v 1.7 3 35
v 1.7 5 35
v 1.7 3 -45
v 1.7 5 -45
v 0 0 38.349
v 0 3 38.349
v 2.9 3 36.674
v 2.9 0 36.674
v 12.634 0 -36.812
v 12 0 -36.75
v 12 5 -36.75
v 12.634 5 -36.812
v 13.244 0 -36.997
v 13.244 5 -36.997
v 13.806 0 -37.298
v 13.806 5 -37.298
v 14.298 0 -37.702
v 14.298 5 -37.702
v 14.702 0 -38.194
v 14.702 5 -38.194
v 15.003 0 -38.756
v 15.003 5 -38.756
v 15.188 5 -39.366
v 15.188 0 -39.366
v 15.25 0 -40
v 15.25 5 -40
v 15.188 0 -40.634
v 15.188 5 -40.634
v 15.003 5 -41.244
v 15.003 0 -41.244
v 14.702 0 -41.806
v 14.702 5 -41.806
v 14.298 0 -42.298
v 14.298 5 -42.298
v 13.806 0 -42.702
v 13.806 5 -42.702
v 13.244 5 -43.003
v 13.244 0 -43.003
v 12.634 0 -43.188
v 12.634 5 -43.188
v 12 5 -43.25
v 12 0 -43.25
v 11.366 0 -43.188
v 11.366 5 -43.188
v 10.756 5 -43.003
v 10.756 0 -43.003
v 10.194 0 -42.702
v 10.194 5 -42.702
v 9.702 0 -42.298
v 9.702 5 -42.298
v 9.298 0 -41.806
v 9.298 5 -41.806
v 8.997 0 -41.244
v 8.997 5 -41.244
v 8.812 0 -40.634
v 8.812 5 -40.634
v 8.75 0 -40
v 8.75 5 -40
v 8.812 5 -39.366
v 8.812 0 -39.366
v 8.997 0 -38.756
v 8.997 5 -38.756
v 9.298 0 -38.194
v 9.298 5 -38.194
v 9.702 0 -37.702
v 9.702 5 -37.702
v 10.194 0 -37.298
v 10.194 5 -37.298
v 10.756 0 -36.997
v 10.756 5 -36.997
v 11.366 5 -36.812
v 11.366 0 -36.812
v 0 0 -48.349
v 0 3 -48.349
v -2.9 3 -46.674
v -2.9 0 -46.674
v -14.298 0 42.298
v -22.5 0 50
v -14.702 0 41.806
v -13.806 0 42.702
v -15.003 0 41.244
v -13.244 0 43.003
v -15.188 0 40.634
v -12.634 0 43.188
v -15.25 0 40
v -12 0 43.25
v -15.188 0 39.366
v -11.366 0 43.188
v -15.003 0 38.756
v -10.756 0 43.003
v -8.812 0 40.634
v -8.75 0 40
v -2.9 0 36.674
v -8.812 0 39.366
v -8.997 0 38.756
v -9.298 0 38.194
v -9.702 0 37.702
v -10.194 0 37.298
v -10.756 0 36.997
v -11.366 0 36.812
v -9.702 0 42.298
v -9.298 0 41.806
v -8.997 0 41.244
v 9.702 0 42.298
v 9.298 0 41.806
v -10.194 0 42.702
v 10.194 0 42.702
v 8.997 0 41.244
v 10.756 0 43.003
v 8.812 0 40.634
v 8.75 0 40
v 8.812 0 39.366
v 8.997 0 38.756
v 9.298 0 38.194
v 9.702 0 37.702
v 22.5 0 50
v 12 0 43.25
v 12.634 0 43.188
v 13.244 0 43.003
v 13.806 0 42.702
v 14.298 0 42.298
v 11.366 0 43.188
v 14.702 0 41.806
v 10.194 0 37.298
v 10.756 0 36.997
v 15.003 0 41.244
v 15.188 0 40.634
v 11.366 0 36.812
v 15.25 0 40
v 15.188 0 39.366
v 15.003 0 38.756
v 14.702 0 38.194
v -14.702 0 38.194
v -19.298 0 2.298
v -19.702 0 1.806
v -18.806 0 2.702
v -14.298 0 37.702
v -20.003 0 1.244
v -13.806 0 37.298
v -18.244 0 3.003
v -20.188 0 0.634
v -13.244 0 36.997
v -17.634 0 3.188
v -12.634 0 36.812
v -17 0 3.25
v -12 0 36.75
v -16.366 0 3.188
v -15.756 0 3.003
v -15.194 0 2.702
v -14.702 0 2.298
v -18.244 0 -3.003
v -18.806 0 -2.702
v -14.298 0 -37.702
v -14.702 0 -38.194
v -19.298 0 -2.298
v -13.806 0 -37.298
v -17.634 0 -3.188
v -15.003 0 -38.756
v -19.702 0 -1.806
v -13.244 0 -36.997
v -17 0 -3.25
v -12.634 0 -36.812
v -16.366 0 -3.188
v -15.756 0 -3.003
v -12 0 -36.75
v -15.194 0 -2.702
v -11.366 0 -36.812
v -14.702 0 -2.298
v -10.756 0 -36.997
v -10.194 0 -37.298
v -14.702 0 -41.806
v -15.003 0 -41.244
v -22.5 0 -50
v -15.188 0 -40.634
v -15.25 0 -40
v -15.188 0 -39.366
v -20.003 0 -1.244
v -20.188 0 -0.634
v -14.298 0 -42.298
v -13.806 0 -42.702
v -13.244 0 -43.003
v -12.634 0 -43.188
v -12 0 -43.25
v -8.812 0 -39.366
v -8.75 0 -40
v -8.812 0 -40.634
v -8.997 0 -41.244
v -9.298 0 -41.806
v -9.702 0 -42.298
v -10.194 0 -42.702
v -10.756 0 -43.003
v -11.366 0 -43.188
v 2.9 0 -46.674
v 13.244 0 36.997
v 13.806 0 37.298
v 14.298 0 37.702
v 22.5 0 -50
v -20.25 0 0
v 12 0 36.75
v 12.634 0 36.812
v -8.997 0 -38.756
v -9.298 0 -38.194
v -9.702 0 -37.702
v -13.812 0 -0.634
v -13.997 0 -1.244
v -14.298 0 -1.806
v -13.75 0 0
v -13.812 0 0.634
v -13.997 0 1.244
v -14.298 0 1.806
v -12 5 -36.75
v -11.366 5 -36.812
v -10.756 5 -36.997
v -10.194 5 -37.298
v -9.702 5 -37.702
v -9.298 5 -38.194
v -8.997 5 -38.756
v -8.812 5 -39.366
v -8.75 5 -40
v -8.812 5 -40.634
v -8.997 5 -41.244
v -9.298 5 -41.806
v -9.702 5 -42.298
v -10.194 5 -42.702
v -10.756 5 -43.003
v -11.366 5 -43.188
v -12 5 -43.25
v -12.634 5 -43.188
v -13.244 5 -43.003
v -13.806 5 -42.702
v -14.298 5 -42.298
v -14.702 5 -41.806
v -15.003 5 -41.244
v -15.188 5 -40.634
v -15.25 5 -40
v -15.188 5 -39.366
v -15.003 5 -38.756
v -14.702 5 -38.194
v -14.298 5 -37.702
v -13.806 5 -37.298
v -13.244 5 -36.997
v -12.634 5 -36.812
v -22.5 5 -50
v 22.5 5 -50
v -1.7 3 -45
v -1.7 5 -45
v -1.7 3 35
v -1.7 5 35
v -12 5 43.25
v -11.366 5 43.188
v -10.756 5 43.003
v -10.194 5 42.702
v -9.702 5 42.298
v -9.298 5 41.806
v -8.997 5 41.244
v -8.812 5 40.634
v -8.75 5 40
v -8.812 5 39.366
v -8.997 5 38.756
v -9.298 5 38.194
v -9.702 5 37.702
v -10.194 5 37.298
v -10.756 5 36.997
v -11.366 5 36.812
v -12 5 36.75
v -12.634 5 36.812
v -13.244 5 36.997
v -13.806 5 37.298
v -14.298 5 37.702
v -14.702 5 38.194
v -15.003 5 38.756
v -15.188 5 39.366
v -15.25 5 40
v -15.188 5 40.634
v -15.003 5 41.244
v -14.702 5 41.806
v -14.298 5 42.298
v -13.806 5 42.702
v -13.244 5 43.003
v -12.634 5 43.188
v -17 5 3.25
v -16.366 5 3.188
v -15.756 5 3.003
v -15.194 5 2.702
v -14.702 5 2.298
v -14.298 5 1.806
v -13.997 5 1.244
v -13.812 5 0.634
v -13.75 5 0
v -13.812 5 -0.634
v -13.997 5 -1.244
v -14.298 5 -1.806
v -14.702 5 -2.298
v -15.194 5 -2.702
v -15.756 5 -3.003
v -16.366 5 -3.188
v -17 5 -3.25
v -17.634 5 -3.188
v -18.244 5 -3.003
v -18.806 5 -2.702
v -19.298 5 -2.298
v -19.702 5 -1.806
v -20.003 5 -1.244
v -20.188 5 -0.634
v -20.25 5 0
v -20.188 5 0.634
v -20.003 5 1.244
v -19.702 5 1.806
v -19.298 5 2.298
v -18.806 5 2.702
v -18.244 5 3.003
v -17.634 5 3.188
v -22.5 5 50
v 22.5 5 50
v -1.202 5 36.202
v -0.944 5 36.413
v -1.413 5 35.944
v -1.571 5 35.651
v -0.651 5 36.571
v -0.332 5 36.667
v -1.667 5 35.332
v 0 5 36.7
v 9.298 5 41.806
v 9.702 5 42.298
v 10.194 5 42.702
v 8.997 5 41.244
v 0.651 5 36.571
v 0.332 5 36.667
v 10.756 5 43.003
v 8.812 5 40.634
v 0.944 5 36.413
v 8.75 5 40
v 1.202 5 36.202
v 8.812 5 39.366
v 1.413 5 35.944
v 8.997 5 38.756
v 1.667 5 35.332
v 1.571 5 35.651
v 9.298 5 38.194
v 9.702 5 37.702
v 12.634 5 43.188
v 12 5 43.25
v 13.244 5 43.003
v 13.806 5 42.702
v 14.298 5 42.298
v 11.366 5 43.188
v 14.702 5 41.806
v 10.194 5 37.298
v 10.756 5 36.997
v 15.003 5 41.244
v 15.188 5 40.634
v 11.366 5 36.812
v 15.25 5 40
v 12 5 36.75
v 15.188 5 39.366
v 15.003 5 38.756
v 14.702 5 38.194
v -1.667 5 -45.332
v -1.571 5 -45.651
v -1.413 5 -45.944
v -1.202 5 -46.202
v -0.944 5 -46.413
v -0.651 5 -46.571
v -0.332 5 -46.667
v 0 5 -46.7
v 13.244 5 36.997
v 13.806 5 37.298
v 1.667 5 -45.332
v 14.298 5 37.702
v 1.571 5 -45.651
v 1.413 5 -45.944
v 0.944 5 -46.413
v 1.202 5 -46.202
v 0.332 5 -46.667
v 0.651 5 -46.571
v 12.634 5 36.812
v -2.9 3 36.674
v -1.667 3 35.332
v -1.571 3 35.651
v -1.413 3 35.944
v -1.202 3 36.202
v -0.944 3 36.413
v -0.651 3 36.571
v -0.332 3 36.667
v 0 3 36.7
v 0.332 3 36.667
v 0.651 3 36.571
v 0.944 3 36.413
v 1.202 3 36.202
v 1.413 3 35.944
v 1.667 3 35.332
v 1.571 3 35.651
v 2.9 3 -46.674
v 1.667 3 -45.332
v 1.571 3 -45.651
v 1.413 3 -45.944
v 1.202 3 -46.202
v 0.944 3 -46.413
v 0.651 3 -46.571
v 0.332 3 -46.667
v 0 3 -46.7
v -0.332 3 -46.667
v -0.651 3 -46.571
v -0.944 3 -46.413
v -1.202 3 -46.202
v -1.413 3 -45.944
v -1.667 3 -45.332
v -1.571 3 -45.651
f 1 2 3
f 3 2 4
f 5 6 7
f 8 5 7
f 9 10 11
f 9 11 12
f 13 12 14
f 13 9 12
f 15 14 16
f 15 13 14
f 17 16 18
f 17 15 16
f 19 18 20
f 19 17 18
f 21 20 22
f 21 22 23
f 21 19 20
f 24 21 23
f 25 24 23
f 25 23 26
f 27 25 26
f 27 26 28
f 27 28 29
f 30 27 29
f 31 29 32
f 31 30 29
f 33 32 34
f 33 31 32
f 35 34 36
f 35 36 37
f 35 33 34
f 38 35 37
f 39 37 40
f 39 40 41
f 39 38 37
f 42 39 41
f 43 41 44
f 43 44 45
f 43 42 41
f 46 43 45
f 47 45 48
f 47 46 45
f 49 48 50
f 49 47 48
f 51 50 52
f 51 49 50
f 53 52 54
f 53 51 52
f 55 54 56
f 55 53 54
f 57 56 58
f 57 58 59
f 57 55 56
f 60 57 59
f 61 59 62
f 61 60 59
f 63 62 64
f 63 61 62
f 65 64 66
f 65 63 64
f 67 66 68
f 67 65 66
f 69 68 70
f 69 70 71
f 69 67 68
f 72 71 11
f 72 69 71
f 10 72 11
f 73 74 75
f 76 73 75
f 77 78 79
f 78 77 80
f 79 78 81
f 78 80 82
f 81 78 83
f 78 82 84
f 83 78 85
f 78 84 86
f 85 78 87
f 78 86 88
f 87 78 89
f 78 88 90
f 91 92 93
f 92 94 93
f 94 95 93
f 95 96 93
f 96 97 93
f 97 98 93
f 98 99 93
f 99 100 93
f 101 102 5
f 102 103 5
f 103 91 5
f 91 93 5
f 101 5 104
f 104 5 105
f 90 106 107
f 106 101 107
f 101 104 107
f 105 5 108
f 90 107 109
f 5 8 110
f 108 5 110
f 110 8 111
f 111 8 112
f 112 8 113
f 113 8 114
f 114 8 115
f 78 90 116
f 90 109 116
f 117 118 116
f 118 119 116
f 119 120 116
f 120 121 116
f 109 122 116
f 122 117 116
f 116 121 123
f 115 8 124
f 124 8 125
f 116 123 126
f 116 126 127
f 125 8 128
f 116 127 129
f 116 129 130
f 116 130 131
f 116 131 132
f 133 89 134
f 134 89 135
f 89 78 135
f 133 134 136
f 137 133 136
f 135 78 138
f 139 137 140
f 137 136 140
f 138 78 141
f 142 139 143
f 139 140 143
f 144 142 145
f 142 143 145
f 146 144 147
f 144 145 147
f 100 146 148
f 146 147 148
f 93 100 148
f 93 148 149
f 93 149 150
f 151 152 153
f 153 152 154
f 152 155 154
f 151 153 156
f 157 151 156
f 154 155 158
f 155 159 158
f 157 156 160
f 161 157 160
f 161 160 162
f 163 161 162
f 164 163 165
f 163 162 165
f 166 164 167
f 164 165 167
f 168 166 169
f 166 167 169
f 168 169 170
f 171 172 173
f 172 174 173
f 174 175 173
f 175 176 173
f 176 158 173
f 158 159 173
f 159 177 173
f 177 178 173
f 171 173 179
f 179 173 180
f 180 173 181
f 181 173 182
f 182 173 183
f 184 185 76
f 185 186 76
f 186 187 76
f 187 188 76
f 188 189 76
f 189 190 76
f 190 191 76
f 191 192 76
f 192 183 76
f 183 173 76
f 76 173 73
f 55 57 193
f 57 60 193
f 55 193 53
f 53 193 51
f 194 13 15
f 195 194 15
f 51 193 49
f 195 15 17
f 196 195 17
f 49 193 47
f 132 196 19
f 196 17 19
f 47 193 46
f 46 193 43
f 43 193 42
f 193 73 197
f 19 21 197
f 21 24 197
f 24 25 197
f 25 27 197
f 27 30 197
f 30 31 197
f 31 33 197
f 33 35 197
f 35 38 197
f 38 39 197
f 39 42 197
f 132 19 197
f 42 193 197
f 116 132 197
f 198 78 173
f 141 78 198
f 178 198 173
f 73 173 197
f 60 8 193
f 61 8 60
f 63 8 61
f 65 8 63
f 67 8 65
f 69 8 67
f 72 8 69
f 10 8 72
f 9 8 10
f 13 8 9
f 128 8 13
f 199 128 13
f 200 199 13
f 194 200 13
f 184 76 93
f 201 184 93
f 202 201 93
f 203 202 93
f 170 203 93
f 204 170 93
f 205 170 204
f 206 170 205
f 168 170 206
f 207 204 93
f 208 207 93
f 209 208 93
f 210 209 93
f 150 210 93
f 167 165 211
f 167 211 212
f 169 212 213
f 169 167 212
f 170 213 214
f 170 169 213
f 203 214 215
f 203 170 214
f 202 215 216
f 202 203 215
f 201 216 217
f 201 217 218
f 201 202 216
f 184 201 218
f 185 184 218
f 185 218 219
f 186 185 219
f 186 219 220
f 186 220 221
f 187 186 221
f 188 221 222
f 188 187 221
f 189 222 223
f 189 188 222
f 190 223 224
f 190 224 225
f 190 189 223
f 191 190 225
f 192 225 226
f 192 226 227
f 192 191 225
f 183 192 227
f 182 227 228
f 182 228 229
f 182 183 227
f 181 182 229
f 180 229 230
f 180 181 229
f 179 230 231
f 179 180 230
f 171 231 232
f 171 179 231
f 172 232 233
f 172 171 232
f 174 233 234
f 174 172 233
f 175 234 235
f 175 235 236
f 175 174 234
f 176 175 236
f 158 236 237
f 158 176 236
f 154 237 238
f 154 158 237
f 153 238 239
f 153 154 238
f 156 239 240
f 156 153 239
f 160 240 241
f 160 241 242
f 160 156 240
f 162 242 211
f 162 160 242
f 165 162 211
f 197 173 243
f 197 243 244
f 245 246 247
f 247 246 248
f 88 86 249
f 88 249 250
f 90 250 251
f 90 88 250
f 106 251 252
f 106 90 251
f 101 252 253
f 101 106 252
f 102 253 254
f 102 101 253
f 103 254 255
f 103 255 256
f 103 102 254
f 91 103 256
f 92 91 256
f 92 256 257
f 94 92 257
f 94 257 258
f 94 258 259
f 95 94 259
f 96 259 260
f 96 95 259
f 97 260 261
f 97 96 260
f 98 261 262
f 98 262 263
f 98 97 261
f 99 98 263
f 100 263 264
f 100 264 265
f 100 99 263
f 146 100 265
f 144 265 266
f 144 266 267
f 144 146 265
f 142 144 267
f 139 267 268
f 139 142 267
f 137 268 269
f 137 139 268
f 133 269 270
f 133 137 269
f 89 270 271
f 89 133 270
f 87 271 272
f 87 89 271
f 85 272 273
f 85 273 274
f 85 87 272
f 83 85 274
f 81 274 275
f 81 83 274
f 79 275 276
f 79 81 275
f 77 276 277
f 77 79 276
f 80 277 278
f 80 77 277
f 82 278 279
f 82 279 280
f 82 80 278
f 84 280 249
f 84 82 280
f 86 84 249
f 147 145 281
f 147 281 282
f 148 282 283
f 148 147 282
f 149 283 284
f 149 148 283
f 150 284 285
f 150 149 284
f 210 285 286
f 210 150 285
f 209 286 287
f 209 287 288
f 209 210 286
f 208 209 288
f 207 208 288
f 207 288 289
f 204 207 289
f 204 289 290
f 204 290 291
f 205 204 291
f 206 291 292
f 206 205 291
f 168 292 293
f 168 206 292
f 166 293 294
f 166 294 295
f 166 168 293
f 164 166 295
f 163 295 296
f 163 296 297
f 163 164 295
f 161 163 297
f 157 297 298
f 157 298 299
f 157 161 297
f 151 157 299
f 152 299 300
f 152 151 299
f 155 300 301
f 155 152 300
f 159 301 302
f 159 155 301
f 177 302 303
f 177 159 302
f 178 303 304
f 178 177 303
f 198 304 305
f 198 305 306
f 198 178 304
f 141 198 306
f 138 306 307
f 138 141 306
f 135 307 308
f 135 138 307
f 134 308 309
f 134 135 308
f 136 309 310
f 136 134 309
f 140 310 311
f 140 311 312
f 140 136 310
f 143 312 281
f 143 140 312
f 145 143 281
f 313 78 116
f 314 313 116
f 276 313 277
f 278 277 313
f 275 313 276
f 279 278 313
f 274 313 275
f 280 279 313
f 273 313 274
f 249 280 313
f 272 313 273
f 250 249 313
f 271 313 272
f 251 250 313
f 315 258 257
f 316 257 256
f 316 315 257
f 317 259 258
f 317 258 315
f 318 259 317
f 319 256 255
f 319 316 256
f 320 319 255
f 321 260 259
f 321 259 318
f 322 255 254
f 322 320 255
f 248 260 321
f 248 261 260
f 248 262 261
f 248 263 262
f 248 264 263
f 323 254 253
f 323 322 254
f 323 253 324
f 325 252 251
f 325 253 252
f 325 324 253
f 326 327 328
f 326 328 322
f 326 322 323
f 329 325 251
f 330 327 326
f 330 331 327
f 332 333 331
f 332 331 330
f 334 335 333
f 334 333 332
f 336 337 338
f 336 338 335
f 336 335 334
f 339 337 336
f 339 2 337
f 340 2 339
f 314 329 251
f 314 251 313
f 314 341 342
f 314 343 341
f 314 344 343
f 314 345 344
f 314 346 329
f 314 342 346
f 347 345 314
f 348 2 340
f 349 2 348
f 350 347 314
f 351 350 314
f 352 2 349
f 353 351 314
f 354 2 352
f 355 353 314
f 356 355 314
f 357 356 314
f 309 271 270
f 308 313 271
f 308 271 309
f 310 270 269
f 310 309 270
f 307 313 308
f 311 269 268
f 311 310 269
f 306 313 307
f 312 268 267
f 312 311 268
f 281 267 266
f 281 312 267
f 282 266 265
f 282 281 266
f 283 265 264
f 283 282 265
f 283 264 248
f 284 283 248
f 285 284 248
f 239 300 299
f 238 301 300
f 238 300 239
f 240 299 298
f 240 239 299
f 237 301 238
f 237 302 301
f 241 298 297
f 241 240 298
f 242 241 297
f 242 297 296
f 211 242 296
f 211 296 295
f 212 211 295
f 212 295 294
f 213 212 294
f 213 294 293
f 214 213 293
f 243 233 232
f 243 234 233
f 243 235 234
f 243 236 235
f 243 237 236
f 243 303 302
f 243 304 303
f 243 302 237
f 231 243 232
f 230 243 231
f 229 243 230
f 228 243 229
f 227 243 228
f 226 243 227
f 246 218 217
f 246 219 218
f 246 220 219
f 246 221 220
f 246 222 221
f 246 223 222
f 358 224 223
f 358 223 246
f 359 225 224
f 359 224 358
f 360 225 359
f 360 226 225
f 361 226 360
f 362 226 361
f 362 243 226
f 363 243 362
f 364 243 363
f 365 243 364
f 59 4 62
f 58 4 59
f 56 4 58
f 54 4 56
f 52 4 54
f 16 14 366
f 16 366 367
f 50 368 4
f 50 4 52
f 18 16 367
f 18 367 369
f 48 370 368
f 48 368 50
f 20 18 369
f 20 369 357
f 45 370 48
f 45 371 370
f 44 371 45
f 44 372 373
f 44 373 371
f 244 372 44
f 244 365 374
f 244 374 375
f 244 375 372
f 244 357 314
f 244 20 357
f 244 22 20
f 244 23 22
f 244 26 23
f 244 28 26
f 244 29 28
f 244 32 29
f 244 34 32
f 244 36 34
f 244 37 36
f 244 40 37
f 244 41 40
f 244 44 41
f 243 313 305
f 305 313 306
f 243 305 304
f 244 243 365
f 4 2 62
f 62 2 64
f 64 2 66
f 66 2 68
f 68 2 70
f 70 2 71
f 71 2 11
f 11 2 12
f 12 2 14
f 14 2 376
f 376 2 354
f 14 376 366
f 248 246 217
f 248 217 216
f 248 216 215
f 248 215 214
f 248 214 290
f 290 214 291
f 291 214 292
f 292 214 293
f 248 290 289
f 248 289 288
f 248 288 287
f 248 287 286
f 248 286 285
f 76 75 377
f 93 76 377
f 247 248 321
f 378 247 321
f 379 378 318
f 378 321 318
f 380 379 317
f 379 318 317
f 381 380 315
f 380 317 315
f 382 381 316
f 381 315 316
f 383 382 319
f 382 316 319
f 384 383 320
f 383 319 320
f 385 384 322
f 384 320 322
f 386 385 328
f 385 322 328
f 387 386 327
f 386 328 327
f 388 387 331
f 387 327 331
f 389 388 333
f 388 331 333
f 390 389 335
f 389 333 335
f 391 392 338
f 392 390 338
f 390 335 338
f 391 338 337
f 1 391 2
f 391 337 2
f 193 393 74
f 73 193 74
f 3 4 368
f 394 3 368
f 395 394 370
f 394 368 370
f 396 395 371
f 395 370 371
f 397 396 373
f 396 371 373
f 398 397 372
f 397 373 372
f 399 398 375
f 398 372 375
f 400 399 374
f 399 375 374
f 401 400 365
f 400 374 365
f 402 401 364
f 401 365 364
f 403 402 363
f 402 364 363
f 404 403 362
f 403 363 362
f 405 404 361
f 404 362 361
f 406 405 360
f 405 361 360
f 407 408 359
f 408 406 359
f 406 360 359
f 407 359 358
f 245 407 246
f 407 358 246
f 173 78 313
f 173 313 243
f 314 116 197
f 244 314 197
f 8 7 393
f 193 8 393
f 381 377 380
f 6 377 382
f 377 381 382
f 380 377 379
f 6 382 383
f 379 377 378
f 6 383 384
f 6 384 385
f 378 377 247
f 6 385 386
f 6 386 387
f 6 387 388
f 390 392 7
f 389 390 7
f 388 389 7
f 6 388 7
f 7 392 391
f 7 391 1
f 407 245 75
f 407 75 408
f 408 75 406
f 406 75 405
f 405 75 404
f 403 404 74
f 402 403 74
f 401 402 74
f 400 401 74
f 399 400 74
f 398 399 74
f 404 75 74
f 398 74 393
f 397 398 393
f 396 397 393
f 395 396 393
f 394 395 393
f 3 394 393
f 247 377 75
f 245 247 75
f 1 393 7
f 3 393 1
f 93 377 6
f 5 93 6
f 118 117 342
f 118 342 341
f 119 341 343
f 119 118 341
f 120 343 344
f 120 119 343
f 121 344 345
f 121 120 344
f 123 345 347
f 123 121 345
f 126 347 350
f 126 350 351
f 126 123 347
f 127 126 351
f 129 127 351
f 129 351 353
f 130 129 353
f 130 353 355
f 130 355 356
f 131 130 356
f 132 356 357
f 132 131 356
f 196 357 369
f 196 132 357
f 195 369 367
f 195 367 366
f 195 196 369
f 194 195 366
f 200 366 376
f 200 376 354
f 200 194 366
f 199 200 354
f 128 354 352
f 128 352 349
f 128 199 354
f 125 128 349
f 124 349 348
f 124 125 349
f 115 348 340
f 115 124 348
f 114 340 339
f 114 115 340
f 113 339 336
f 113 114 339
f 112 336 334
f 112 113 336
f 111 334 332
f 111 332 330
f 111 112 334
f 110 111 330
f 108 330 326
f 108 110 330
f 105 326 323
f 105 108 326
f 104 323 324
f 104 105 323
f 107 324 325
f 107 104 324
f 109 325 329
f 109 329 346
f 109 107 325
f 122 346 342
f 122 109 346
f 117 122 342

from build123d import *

# Parameters (mm, degrees)
SKETCH1_W           = 45
SKETCH1_H           = 100
SKETCH1_R           = 3.25
BOSS_EXTRUDE1_DEPTH = 5
CUT_EXTRUDE1_DEPTH  = 2
CUT_EXTRUDE2_REACH  = 56.911


with BuildPart() as part:
    # Sketch1 → Boss-Extrude1 (new body)
    with BuildSketch(Plane(origin=(0, 0, 0), x_dir=(1, 0, 0), z_dir=(0, 1, 0))):
        Rectangle(SKETCH1_W, SKETCH1_H)
        with Locations(Location((-12, 40, 0), (0, 0, 270))):
            Circle(SKETCH1_R, mode=Mode.SUBTRACT)
        with Locations(Location((12, 40, 0), (0, 0, 270))):
            Circle(SKETCH1_R, mode=Mode.SUBTRACT)
        with Locations(Location((12, -40, 0), (0, 0, 270))):
            Circle(SKETCH1_R, mode=Mode.SUBTRACT)
        with Locations(Location((-12, -40, 0), (0, 0, 270))):
            Circle(SKETCH1_R, mode=Mode.SUBTRACT)
        with Locations(Location((-17, 0, 0), (0, 0, 270))):
            Circle(SKETCH1_R, mode=Mode.SUBTRACT)
    extrude(amount=BOSS_EXTRUDE1_DEPTH)

    # Sketch2 → Cut-Extrude1 (cut)
    with BuildSketch(Plane(origin=(0, 5, 0), x_dir=(1, 0, 0), z_dir=(0, 1, 0))):
        with BuildLine():
            Line((1.7, 45), (1.7, -35))
            ThreePointArc((1.7, -35), (0, -36.7), (-1.7, -35))
            Line((-1.7, -35), (-1.7, 45))
            ThreePointArc((-1.7, 45), (0, 46.7), (1.7, 45))
        make_face()
    extrude(amount=-CUT_EXTRUDE1_DEPTH, mode=Mode.SUBTRACT)

    # Sketch3 → Cut-Extrude2 (cut, up to next)
    with BuildSketch(Plane(origin=(0, 3, 0), x_dir=(1, 0, 0), z_dir=(0, 1, 0)), mode=Mode.PRIVATE) as cut_extrude2_sk1:
        with BuildLine():
            Line((0, 41.651368439), (1.7, 42.632863896))
            Line((1.7, 42.632863896), (1.7, 45))
            ThreePointArc((1.7, 45), (0, 46.7), (-1.7, 45))
            Line((-1.7, 45), (-1.7, 42.632863896))
            Line((-1.7, 42.632863896), (0, 41.651368439))
        make_face()
    cut_extrude2_tool1 = extrude(cut_extrude2_sk1.sketch, amount=-CUT_EXTRUDE2_REACH, mode=Mode.PRIVATE) & part.part
    # Sketch3 → Cut-Extrude2 (cut, up to next)
    with BuildSketch(Plane(origin=(0, 3, 0), x_dir=(1, 0, 0), z_dir=(0, 1, 0)), mode=Mode.PRIVATE) as cut_extrude2_sk2:
        Polygon((1.7, -32.632863896), (1.7, 42.632863896), (0, 41.651368439), (-1.7, 42.632863896), (-1.7, -32.632863896), (0, -31.651368439), align=None)
    cut_extrude2_tool2 = extrude(cut_extrude2_sk2.sketch, amount=-CUT_EXTRUDE2_REACH, mode=Mode.PRIVATE) & part.part
    # Sketch3 → Cut-Extrude2 (cut, up to next)
    with BuildSketch(Plane(origin=(0, 3, 0), x_dir=(1, 0, 0), z_dir=(0, 1, 0)), mode=Mode.PRIVATE) as cut_extrude2_sk3:
        with BuildLine():
            Line((1.7, -35), (1.7, -32.632863896))
            Line((1.7, -32.632863896), (0, -31.651368439))
            Line((0, -31.651368439), (-1.7, -32.632863896))
            Line((-1.7, -32.632863896), (-1.7, -35))
            ThreePointArc((-1.7, -35), (0, -36.7), (1.7, -35))
        make_face()
    cut_extrude2_tool3 = extrude(cut_extrude2_sk3.sketch, amount=-CUT_EXTRUDE2_REACH, mode=Mode.PRIVATE) & part.part
    # Sketch3 → Cut-Extrude2 (cut, up to next)
    with BuildSketch(Plane(origin=(0, 3, 0), x_dir=(1, 0, 0), z_dir=(0, 1, 0)), mode=Mode.PRIVATE) as cut_extrude2_sk4:
        Polygon((-1.7, -32.632863896), (-1.7, 42.632863896), (-2.9, 43.325684219), (-2.9, -33.325684219), align=None)
    cut_extrude2_tool4 = extrude(cut_extrude2_sk4.sketch, amount=-CUT_EXTRUDE2_REACH, mode=Mode.PRIVATE) & part.part
    # Sketch3 → Cut-Extrude2 (cut, up to next)
    with BuildSketch(Plane(origin=(0, 3, 0), x_dir=(1, 0, 0), z_dir=(0, 1, 0)), mode=Mode.PRIVATE) as cut_extrude2_sk5:
        Polygon((2.9, -33.325684219), (2.9, 43.325684219), (1.7, 42.632863896), (1.7, -32.632863896), align=None)
    cut_extrude2_tool5 = extrude(cut_extrude2_sk5.sketch, amount=-CUT_EXTRUDE2_REACH, mode=Mode.PRIVATE) & part.part
    # Sketch3 → Cut-Extrude2 (cut, up to next)
    with BuildSketch(Plane(origin=(0, 3, 0), x_dir=(1, 0, 0), z_dir=(0, 1, 0)), mode=Mode.PRIVATE) as cut_extrude2_sk6:
        with BuildLine():
            Line((1.7, 42.632863896), (2.9, 43.325684219))
            Line((2.9, 43.325684219), (2.9, 46.674315781))
            Line((2.9, 46.674315781), (0, 48.348631561))
            Line((0, 48.348631561), (-2.9, 46.674315781))
            Line((-2.9, 46.674315781), (-2.9, 43.325684219))
            Line((-2.9, 43.325684219), (-1.7, 42.632863896))
            Line((-1.7, 42.632863896), (-1.7, 45))
            ThreePointArc((-1.7, 45), (0, 46.7), (1.7, 45))
            Line((1.7, 45), (1.7, 42.632863896))
        make_face()
    cut_extrude2_tool6 = extrude(cut_extrude2_sk6.sketch, amount=-CUT_EXTRUDE2_REACH, mode=Mode.PRIVATE) & part.part
    # Sketch3 → Cut-Extrude2 (cut, up to next)
    with BuildSketch(Plane(origin=(0, 3, 0), x_dir=(1, 0, 0), z_dir=(0, 1, 0)), mode=Mode.PRIVATE) as cut_extrude2_sk7:
        with BuildLine():
            Line((2.9, -36.674315781), (2.9, -33.325684219))
            Line((2.9, -33.325684219), (1.7, -32.632863896))
            Line((1.7, -32.632863896), (1.7, -35))
            ThreePointArc((1.7, -35), (0, -36.7), (-1.7, -35))
            Line((-1.7, -35), (-1.7, -32.632863896))
            Line((-1.7, -32.632863896), (-2.9, -33.325684219))
            Line((-2.9, -33.325684219), (-2.9, -36.674315781))
            Line((-2.9, -36.674315781), (0, -38.348631561))
            Line((0, -38.348631561), (2.9, -36.674315781))
        make_face()
    cut_extrude2_tool7 = extrude(cut_extrude2_sk7.sketch, amount=-CUT_EXTRUDE2_REACH, mode=Mode.PRIVATE) & part.part
    add(cut_extrude2_tool1.solids().sort_by_distance((0, 3, -44.246241))[0], mode=Mode.SUBTRACT)
    add(cut_extrude2_tool2.solids().sort_by_distance((0, 3, -5))[0], mode=Mode.SUBTRACT)
    add(cut_extrude2_tool3.solids().sort_by_distance((0, 3, 34.246241))[0], mode=Mode.SUBTRACT)
    add(cut_extrude2_tool4.solids().sort_by_distance((-2.301824, 3, -5))[0], mode=Mode.SUBTRACT)
    add(cut_extrude2_tool5.solids().sort_by_distance((2.301824, 3, -5))[0], mode=Mode.SUBTRACT)
    add(cut_extrude2_tool6.solids().sort_by_distance((2.259285, 3, -43.049795))[0], mode=Mode.SUBTRACT)
    add(cut_extrude2_tool7.solids().sort_by_distance((1.409285, 3, 37.440952))[0], mode=Mode.SUBTRACT)


solid = part.part
